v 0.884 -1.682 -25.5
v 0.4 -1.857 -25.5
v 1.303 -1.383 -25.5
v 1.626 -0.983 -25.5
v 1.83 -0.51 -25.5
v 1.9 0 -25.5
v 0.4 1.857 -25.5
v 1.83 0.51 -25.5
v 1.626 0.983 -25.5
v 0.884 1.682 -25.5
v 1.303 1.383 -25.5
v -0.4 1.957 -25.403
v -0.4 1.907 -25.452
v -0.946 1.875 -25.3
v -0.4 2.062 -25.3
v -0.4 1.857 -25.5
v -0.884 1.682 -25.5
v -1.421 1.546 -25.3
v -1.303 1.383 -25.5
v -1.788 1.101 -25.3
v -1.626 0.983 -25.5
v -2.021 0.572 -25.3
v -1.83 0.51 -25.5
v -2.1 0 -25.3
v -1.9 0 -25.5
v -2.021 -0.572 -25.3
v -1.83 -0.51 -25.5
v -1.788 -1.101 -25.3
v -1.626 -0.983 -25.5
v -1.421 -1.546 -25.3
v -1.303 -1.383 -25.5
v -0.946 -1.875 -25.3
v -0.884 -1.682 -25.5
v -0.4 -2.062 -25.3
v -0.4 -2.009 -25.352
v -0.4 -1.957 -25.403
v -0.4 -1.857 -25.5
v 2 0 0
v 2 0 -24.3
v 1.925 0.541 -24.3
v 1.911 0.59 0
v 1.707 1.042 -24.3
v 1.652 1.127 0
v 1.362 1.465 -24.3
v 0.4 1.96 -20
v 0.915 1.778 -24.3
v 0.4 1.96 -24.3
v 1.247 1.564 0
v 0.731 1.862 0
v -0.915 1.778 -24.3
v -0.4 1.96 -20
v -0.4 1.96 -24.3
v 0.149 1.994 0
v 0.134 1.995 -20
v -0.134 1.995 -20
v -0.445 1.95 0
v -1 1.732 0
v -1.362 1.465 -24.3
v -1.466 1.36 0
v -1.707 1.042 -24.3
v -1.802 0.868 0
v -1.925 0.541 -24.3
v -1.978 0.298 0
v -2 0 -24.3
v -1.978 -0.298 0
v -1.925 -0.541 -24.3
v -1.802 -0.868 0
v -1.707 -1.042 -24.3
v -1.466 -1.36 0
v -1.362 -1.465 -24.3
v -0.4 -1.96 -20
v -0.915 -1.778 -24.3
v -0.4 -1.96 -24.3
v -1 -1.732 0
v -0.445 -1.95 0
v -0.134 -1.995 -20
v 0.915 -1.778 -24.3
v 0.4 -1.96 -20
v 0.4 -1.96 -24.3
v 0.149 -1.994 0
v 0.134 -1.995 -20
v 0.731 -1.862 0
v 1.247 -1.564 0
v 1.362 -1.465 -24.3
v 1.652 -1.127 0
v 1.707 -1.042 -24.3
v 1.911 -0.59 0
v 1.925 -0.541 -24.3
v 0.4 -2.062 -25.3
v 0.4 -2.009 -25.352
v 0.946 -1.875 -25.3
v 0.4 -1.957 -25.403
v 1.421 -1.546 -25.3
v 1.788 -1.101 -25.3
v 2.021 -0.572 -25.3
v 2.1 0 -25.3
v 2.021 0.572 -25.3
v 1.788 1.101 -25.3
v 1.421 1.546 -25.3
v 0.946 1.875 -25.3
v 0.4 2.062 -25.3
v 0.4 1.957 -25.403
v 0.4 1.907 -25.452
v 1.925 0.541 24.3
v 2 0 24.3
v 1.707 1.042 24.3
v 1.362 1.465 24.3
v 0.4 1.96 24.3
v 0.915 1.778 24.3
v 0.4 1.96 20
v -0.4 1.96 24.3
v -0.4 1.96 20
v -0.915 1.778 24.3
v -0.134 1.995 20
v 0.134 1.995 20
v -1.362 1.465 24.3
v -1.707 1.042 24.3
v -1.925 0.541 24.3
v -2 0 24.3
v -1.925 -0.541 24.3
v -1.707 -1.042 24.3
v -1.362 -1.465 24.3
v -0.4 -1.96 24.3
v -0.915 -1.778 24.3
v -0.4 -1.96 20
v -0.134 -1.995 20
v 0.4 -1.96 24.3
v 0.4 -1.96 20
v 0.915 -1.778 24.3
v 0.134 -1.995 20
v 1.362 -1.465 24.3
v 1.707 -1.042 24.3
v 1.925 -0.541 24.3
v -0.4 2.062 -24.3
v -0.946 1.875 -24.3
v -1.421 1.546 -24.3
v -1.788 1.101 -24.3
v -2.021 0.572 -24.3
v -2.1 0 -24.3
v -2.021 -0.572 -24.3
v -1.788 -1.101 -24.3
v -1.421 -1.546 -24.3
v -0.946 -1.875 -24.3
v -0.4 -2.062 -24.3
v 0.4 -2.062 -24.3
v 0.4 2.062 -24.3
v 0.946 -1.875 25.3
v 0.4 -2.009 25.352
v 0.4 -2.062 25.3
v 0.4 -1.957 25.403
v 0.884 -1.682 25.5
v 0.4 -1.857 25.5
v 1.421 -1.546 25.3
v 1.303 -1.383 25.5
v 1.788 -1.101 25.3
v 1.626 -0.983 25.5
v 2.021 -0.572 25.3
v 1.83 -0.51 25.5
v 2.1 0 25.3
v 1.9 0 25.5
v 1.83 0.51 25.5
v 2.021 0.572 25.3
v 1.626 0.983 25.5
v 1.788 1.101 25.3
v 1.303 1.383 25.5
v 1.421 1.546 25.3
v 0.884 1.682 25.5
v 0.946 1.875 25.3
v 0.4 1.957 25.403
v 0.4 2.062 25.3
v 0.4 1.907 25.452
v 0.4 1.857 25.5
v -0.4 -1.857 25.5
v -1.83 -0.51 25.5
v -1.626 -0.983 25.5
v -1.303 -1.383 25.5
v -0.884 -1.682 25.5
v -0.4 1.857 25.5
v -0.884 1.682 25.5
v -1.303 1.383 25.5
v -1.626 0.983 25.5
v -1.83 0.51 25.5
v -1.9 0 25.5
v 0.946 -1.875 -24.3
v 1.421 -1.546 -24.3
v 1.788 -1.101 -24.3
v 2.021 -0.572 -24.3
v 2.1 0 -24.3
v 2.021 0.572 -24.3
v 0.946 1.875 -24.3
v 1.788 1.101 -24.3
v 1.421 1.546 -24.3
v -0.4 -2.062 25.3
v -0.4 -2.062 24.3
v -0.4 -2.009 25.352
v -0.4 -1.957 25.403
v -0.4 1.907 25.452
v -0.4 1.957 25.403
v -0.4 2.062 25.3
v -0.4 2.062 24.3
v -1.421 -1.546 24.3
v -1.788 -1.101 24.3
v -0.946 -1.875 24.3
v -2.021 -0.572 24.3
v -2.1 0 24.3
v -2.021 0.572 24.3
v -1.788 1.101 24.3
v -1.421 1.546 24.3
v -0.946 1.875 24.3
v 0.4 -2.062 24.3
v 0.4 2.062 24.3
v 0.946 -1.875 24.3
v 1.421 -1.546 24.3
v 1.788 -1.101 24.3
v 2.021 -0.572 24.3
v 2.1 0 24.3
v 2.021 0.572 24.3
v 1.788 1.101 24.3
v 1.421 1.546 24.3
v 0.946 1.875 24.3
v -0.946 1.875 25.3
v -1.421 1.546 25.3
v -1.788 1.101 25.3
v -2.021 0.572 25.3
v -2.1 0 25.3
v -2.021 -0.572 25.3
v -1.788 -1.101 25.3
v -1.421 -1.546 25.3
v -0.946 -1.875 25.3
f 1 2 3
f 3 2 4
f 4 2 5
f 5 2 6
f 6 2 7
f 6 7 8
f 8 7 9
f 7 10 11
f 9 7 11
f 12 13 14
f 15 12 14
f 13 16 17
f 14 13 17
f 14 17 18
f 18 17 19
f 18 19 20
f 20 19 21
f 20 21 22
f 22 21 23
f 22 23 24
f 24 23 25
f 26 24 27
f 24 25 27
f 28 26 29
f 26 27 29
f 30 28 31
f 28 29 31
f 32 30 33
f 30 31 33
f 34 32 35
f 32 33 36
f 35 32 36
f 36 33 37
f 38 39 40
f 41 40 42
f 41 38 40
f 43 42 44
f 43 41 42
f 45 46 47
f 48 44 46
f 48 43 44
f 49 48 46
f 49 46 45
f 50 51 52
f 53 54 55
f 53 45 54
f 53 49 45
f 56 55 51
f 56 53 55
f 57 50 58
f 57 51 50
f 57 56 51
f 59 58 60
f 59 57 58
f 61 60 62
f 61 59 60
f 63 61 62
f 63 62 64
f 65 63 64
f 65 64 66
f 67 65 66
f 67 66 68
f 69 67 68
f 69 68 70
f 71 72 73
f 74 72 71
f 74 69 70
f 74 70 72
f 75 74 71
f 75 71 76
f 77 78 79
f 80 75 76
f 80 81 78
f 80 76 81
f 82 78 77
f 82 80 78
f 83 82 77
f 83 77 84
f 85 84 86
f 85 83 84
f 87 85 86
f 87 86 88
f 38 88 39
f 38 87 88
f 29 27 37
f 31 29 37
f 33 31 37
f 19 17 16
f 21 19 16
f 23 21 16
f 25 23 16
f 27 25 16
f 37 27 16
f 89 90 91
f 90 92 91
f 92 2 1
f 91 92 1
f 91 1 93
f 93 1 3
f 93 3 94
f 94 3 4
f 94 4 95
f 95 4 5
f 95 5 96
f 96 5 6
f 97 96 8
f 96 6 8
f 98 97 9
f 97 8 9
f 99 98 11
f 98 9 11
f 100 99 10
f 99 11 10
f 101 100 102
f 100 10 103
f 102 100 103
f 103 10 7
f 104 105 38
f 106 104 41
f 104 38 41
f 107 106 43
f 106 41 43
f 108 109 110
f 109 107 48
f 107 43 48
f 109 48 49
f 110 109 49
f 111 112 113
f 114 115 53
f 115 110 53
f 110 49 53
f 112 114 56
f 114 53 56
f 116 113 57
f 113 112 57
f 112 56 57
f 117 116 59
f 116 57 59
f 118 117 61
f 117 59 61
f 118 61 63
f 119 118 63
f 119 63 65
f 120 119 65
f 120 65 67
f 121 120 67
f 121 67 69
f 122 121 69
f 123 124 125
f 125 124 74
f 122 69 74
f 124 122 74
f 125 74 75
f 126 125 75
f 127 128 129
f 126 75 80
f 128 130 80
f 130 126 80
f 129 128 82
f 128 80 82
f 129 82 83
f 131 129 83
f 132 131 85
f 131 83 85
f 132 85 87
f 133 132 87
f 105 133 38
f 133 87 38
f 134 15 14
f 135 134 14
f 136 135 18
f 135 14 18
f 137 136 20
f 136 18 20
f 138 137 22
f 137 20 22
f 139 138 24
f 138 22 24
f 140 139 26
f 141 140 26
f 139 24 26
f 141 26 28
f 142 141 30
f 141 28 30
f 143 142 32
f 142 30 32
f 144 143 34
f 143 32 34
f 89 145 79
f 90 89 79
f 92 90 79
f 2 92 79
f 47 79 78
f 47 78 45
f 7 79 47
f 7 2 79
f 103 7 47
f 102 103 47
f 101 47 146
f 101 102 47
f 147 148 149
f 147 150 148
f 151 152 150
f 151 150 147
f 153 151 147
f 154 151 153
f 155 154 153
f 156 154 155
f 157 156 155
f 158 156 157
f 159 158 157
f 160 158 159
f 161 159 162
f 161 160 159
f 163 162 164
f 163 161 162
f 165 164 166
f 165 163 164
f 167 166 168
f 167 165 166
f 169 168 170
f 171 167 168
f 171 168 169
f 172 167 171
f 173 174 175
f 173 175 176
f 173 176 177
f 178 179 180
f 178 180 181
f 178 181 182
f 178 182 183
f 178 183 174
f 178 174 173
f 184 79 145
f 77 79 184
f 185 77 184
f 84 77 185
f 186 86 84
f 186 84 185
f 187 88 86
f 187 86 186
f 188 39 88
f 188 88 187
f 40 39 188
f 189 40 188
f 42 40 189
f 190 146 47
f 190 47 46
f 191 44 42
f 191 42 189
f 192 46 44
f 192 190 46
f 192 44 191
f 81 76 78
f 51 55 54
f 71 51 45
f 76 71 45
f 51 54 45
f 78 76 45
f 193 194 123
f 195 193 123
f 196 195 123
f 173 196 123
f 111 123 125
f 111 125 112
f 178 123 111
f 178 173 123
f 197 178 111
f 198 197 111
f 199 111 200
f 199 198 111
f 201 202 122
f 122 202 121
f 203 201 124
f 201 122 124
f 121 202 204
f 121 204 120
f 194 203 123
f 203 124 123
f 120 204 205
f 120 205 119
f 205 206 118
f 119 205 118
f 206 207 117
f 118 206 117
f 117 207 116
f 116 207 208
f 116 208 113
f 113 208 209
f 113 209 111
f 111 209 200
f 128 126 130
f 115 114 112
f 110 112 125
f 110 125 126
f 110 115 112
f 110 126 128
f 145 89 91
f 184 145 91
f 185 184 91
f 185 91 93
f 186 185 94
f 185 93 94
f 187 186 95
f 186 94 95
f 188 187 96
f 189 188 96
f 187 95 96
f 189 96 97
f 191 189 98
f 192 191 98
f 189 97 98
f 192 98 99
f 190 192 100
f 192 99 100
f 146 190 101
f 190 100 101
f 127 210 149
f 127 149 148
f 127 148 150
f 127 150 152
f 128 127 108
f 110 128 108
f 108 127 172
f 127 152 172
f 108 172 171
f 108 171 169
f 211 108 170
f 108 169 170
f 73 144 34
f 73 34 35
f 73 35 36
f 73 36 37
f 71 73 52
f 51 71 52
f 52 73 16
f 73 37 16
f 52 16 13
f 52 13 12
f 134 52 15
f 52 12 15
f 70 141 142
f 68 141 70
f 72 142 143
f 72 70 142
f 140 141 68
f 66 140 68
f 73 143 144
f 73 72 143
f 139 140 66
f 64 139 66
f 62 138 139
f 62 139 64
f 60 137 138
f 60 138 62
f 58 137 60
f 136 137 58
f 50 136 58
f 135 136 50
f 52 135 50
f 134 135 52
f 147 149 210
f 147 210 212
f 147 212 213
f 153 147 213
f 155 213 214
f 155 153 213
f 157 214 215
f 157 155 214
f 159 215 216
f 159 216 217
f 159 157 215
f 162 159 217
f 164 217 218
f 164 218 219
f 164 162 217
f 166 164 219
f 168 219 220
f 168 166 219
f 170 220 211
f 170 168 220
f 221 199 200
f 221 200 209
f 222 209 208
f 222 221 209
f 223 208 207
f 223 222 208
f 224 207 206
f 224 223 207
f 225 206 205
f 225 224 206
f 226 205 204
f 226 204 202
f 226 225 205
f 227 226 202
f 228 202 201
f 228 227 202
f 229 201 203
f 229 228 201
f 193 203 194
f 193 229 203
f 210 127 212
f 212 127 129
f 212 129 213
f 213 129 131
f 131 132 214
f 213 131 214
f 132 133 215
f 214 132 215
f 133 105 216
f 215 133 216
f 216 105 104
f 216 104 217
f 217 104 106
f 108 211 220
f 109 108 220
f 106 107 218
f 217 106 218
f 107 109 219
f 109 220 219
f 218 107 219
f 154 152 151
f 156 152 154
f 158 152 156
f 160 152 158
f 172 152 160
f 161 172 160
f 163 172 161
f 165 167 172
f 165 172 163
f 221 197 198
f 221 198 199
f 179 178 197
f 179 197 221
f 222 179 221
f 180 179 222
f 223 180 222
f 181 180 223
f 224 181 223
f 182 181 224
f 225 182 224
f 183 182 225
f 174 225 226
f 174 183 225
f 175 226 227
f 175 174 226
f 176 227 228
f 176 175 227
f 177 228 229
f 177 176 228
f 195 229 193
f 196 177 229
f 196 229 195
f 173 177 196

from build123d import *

# Parameters (mm, degrees)
SKETCH_1_R          = 2
EXTRUDE_1_DEPTH     = 25.5
SKETCH_2_R          = 2.1
EXTRUDE_2_DEPTH     = 1.2
CHAMFER_1_SIZE      = 0.2
SKETCH_3_W          = 0.8
SKETCH_3_H          = 4.5
CUT_EXTRUDE_1_DEPTH = 5.5


# Read off the part's stored shape, not the designer's step: 镜向1
with BuildPart() as part:
    # 草图1 → 凸台-拉伸1 (new body)
    with BuildSketch(Plane.XY):
        Circle(SKETCH_1_R)
    extrude(amount=EXTRUDE_1_DEPTH)

    # 草图2 → 凸台-拉伸2 (add)
    with BuildSketch(Plane.XY.offset(25.5)):
        Circle(SKETCH_2_R)
    extrude(amount=-EXTRUDE_2_DEPTH)

    # 倒角1
    chamfer_1_edges = [part.edges().sort_by_distance(p)[0] for p in [
        (-2.1, 0, 25.5),
    ]]
    chamfer(chamfer_1_edges, length=CHAMFER_1_SIZE)

    # 草图3 → 切除-拉伸1 (cut)
    with BuildSketch(Plane.XY.offset(25.5)):
        Rectangle(SKETCH_3_W, SKETCH_3_H)
    extrude(amount=-CUT_EXTRUDE_1_DEPTH, mode=Mode.SUBTRACT)

    # 镜向1: part across plane


with BuildPart() as part_1:
    add(part.part)
    add(part.part.mirror(Plane.XY))


solid = part_1.part
